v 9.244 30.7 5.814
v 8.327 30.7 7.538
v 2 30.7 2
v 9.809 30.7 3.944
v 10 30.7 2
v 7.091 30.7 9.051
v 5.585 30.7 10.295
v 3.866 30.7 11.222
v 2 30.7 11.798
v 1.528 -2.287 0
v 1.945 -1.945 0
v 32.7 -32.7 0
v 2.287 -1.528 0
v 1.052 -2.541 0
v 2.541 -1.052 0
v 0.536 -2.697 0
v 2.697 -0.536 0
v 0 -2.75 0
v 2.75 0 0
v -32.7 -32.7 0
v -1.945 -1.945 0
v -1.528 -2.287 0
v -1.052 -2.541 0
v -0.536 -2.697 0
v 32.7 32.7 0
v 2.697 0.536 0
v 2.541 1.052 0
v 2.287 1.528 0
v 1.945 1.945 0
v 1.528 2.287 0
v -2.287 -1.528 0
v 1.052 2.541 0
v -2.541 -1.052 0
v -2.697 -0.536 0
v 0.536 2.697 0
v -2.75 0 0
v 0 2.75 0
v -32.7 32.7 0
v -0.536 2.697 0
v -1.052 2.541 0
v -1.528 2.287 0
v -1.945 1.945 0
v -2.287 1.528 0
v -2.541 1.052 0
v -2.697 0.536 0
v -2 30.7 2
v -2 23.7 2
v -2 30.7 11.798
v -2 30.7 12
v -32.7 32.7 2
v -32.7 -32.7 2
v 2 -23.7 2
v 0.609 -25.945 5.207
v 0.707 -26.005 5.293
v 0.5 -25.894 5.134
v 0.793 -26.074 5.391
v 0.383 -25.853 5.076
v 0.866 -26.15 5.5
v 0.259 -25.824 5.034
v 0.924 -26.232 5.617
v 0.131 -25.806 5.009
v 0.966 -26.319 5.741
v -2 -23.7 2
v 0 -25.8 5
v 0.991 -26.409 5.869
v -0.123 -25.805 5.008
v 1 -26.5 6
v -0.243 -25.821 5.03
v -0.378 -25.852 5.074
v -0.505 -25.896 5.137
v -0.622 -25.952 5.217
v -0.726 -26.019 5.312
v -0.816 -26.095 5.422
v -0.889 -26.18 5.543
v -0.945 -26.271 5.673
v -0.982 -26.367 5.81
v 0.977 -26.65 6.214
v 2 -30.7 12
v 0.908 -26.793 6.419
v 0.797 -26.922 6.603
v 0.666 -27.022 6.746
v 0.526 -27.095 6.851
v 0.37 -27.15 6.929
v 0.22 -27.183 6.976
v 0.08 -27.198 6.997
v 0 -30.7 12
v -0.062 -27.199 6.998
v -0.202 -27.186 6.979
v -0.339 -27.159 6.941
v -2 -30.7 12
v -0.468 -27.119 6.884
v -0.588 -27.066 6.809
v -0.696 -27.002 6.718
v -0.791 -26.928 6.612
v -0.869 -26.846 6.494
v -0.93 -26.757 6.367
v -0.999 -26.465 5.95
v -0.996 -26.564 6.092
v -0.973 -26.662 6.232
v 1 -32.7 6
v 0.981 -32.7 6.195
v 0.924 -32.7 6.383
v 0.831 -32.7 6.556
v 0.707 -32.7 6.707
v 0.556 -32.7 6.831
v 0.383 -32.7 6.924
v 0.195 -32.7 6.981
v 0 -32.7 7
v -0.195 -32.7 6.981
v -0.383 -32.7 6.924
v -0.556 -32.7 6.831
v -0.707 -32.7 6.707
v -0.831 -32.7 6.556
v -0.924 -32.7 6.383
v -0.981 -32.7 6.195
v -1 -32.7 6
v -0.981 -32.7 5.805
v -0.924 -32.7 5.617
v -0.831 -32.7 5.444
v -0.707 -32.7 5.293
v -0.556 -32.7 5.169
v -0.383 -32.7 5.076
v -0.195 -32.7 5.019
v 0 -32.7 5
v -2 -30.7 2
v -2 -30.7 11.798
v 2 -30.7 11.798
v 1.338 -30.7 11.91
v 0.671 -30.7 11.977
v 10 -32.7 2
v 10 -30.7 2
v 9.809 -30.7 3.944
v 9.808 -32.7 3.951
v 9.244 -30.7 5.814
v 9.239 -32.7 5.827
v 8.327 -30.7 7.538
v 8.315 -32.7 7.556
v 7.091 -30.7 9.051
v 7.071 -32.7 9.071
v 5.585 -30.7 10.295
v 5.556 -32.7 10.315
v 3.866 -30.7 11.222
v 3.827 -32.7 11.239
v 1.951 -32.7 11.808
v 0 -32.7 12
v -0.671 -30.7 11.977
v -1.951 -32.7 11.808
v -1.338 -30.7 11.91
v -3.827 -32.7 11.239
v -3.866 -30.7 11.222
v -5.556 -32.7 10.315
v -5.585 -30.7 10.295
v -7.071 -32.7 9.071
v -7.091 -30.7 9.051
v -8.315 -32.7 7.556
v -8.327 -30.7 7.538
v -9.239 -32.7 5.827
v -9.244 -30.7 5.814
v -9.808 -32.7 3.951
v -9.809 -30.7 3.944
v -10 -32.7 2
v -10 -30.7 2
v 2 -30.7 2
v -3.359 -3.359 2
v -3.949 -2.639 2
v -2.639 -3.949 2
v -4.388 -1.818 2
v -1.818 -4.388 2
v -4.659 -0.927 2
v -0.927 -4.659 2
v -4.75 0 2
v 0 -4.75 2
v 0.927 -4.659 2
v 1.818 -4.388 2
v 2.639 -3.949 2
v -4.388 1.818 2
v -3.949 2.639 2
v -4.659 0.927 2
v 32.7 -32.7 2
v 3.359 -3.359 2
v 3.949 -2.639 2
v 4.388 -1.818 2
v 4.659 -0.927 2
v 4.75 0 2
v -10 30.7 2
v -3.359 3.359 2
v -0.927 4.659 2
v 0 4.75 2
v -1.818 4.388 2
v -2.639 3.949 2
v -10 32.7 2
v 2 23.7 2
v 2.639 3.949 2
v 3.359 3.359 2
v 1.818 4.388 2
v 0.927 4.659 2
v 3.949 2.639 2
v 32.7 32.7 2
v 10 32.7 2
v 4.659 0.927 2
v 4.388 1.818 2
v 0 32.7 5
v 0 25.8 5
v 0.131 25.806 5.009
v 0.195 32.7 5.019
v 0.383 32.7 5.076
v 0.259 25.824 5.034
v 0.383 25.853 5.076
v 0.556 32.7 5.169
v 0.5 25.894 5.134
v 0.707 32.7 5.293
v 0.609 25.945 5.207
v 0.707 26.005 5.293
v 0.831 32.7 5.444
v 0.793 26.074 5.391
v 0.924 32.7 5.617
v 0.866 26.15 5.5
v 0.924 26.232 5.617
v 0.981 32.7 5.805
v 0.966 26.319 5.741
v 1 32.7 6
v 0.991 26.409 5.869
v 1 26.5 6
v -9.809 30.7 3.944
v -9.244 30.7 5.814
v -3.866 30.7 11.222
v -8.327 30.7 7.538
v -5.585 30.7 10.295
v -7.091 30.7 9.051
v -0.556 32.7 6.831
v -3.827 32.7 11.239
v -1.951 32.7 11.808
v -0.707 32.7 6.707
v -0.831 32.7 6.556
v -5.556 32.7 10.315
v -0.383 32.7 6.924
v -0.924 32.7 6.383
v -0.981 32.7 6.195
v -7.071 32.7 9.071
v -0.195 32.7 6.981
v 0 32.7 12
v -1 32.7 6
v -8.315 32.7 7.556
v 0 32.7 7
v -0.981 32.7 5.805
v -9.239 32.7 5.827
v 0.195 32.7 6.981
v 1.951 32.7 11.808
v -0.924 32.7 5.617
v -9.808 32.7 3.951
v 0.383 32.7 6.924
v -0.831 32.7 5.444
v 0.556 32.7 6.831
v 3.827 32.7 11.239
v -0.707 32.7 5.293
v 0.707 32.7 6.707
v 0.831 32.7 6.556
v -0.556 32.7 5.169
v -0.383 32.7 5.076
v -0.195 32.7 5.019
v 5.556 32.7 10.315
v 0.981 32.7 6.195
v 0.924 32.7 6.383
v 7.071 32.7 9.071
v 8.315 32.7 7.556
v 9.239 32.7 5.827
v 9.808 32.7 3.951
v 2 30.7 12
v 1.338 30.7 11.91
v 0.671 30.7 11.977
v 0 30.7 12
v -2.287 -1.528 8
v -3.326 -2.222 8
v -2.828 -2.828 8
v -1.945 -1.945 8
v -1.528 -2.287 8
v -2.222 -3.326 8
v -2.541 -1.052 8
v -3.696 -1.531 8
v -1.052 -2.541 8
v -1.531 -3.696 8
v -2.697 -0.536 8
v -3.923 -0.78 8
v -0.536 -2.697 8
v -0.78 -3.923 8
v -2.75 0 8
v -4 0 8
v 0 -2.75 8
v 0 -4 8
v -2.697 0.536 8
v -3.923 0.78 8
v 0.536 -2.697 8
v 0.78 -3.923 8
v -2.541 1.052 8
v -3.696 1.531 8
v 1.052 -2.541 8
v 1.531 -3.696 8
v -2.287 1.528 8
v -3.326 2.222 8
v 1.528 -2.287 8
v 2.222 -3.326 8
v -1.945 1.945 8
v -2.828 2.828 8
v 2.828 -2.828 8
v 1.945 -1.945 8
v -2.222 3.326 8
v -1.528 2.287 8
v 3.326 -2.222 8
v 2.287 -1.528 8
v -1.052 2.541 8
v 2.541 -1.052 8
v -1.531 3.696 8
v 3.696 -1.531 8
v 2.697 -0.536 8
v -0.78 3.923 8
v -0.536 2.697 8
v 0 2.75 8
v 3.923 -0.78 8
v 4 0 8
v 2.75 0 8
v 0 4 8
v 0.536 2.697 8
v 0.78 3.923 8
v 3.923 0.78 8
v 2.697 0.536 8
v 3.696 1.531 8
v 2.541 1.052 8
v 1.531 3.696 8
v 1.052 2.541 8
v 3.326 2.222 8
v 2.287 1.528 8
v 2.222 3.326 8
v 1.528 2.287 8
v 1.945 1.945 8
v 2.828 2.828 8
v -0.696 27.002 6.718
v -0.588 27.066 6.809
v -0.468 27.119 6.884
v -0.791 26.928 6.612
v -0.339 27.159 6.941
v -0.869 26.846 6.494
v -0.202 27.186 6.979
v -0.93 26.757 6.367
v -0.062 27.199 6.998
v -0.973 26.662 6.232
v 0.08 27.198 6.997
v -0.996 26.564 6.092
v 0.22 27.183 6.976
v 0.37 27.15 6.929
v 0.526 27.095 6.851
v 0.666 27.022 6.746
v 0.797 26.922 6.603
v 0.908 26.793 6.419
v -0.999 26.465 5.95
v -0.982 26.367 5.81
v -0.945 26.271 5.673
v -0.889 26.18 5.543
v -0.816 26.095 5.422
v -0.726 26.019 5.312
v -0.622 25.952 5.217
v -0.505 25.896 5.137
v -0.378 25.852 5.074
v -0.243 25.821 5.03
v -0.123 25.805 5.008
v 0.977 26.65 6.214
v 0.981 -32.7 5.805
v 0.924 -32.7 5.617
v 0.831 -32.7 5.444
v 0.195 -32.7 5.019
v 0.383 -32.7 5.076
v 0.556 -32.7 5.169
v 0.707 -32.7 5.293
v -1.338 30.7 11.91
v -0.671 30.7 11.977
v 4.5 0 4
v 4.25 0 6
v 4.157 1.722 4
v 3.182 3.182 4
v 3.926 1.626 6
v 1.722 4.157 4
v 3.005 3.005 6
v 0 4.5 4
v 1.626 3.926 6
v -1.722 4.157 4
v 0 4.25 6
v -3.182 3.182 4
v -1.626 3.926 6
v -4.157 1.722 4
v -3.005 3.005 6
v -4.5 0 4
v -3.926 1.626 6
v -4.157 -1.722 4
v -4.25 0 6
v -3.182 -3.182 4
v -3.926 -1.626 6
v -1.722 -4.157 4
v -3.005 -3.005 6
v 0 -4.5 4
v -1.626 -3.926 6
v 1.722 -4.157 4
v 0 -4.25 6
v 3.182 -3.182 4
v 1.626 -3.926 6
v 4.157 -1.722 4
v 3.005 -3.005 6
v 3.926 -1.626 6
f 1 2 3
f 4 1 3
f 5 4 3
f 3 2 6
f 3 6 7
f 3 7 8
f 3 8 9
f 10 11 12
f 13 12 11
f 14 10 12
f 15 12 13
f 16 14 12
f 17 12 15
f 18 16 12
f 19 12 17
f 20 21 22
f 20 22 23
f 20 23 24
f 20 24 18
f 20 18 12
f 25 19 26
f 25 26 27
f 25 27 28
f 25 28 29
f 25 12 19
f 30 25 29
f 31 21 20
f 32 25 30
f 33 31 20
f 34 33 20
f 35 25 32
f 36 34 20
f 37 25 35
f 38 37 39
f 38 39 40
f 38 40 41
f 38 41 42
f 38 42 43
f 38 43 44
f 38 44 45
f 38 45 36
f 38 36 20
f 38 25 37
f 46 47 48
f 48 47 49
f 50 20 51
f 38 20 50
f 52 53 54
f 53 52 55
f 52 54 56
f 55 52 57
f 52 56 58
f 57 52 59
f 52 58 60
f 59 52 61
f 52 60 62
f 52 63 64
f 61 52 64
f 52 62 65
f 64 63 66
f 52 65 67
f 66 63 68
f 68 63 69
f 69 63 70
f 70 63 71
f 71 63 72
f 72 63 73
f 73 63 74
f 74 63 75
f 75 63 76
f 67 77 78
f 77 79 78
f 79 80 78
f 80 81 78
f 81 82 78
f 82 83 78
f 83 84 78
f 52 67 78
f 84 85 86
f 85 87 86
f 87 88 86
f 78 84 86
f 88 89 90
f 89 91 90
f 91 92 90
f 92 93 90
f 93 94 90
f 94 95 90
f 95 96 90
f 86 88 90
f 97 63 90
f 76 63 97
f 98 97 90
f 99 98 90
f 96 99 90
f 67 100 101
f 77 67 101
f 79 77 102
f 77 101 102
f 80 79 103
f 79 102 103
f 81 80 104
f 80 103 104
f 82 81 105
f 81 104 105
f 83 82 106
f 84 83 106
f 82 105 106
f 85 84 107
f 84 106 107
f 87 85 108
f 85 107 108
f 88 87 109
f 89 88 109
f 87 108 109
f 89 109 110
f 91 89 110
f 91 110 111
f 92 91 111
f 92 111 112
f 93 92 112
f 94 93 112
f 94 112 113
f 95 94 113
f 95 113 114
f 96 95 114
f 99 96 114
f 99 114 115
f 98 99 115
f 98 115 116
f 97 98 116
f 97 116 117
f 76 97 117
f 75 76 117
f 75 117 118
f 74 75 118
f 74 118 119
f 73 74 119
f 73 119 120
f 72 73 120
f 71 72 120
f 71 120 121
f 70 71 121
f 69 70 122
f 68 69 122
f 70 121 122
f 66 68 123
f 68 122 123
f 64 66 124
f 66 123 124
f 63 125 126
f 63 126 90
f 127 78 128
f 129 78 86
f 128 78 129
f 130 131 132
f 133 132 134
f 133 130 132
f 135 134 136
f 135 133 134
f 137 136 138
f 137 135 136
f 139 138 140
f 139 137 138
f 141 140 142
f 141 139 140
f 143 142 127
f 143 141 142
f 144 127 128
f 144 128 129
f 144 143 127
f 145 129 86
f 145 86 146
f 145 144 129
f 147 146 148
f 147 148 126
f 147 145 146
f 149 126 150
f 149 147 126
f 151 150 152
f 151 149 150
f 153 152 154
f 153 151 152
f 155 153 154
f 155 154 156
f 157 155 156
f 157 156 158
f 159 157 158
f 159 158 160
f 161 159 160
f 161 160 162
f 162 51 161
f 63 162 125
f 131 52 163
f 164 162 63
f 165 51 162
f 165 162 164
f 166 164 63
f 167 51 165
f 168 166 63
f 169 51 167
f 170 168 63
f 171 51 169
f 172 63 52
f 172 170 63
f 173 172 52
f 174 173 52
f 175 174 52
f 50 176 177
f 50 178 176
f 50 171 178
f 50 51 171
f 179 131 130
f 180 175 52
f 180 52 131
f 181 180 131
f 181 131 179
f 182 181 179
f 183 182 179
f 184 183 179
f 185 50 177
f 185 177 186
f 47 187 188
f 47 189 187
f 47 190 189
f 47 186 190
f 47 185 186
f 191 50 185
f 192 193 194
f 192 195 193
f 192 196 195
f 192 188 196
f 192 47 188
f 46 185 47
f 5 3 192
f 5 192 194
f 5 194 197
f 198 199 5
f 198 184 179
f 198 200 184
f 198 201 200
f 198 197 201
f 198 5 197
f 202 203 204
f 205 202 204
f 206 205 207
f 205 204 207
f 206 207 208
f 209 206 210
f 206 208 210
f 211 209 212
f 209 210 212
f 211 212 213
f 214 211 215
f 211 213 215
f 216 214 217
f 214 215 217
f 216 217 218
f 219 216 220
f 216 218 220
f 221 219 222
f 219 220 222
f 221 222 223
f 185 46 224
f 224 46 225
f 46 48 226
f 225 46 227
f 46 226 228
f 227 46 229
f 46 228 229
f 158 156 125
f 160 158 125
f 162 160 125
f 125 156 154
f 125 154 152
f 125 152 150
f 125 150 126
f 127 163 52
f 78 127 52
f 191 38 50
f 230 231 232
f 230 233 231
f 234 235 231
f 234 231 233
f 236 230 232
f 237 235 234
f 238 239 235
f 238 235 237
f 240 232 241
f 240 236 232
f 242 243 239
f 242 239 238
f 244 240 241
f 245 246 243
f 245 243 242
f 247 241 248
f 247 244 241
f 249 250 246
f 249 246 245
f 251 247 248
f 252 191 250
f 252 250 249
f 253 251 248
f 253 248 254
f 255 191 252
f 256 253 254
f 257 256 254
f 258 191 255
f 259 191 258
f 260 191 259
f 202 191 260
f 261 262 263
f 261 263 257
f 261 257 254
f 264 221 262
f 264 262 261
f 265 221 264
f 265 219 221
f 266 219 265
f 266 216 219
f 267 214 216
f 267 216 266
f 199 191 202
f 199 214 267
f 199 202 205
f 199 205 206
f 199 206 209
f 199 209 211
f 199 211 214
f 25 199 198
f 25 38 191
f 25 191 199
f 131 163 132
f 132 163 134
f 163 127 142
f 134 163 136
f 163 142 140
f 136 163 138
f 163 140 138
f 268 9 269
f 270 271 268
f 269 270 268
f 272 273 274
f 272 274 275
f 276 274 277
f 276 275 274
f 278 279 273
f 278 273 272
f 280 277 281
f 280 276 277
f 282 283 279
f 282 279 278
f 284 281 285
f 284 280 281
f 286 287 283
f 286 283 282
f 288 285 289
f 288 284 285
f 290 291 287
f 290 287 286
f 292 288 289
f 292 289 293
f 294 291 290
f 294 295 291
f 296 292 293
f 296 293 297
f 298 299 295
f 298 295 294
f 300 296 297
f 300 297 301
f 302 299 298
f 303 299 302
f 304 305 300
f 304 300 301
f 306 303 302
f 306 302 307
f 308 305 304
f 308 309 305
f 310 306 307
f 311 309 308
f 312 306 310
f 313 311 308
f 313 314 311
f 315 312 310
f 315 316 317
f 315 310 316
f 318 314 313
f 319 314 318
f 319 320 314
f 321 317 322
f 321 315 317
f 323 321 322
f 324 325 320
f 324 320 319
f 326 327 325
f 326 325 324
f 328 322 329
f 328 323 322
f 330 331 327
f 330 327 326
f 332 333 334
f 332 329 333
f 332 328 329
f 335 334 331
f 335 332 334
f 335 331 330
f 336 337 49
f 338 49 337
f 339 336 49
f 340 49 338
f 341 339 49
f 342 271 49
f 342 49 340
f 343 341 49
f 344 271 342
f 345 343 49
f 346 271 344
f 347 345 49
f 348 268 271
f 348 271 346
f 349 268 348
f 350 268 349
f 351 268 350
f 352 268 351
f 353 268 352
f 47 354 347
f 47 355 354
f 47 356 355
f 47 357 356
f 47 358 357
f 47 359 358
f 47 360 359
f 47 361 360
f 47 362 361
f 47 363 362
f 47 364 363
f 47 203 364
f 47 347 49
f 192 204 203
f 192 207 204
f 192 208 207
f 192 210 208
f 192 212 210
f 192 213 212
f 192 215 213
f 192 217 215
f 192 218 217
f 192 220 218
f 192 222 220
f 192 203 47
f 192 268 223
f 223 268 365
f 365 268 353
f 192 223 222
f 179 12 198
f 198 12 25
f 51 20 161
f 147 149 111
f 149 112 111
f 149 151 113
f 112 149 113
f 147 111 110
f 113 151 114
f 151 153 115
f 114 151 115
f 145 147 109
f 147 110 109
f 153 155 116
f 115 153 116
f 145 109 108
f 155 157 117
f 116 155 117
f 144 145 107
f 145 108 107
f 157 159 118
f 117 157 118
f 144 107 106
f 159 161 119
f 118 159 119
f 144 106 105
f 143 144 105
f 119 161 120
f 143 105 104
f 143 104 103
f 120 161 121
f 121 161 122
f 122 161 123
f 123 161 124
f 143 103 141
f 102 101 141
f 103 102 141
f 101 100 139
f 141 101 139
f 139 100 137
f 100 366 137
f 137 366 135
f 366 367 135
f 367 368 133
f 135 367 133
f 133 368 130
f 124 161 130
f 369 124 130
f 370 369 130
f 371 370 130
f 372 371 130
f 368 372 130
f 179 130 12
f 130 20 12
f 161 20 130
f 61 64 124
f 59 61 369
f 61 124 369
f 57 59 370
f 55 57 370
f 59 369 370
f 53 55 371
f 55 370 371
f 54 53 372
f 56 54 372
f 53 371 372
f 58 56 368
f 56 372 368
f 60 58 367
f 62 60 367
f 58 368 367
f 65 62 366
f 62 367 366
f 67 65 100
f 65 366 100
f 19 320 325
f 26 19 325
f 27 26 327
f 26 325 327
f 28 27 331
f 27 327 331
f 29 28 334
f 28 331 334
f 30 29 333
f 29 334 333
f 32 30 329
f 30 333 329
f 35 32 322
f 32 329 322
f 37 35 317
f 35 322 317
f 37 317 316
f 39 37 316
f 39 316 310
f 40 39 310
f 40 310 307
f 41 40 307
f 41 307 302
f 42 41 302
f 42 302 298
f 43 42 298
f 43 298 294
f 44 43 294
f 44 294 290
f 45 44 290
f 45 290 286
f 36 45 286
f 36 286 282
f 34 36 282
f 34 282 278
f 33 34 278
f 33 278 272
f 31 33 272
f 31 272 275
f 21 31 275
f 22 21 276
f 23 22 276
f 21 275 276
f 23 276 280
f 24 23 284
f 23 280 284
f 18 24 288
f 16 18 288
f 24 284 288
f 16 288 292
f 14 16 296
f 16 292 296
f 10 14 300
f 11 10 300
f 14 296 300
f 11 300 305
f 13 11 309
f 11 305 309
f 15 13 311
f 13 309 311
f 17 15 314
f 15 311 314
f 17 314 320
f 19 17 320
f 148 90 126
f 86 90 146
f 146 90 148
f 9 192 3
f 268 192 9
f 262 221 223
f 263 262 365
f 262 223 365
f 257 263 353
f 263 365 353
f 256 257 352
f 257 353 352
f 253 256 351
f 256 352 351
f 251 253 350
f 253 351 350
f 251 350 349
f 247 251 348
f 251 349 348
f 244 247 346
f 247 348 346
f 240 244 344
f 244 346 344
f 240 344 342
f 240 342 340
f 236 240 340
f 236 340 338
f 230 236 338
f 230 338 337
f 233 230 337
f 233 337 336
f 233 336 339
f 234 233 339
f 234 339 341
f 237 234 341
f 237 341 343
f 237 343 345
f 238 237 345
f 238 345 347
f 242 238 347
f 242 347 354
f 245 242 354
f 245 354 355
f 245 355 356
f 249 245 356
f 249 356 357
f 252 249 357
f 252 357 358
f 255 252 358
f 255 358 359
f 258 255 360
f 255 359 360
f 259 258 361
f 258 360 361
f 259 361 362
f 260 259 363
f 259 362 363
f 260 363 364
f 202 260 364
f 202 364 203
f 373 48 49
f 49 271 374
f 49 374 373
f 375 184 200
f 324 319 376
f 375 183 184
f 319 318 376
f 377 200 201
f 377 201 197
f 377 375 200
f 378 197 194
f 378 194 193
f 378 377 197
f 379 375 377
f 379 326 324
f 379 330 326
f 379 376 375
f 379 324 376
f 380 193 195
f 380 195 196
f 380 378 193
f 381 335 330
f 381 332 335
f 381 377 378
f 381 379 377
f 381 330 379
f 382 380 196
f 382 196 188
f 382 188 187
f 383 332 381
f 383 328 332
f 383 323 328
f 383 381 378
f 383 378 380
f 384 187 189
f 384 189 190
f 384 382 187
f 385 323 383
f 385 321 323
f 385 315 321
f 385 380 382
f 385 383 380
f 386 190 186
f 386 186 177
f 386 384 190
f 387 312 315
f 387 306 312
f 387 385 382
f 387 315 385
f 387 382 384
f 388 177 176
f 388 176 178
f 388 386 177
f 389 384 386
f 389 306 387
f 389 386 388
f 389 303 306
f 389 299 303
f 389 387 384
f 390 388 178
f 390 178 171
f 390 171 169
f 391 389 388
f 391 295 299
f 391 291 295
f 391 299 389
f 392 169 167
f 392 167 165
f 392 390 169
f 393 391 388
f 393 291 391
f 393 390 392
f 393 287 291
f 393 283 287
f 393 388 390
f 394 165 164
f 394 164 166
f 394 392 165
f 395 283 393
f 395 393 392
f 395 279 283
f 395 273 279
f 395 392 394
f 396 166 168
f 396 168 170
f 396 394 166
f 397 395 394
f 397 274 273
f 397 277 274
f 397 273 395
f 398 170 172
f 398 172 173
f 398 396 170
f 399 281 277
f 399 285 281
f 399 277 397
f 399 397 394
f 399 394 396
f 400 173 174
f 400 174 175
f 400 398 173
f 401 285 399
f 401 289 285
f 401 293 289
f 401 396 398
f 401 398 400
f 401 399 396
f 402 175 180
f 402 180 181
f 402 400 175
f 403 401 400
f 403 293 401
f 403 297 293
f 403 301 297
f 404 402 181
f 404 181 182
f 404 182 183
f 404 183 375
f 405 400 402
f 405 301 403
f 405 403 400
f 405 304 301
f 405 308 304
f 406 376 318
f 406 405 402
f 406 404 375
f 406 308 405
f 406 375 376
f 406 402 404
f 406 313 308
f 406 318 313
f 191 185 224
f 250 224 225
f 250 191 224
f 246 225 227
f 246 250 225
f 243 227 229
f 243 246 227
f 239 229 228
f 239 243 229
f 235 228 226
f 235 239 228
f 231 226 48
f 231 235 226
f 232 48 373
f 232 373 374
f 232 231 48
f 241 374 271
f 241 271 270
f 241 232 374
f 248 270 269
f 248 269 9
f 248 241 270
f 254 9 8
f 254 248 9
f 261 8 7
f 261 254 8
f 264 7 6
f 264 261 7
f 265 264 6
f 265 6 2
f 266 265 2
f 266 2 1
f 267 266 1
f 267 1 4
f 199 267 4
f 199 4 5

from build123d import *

# Parameters (mm, degrees)
F0_W          = 65.4
F0_H          = 65.4
F1_DEPTH      = 2
F3_DEPTH      = 2
F5_DEPTH      = 2
F7_DEPTH      = 2
F7_DEPTH_BACK = 2
F9_DEPTH      = 65.401
F12_R         = 2.75
F13_DEPTH     = 8.001


with BuildPart() as f1:
    # F0 (on Top) → F1 (new body)
    with BuildSketch(Plane.XY):
        Rectangle(F0_W, F0_H)
    extrude(amount=F1_DEPTH)

    # F2 (on face) → F3 (join)
    with BuildSketch(Plane.XZ.offset(32.7)):
        with BuildLine():
            Line((-10, 2), (0, 2))
            Line((0, 2), (10, 2))
            ThreePointArc((10, 2), (0, 12), (-10, 2))
        make_face()
    extrude(amount=-F3_DEPTH)

    # F4 (on face) → F5 (join)
    with BuildSketch(Plane(origin=(0, 32.7, 0), x_dir=(-1, 0, 0), z_dir=(0, 1, 0))):
        with BuildLine():
            Line((-10, 2), (0, 2))
            Line((0, 2), (10, 2))
            ThreePointArc((10, 2), (0, 12), (-10, 2))
        make_face()
    extrude(amount=-F5_DEPTH)

    # F6 (on Right) → F7 (join, two sides)
    with BuildSketch(Plane.YZ) as f7_sk:
        Polygon((23.7, 2), (30.7, 2), (30.7, 12), align=None)
        Polygon((-23.7, 2), (-30.7, 12), (-30.7, 2), align=None)
    extrude(amount=F7_DEPTH)
    extrude(f7_sk.sketch, amount=-F7_DEPTH_BACK)

    # F8 (on face) → F9 (cut, through all)
    with BuildSketch(Plane.XZ.offset(32.7)):
        with BuildLine():
            ThreePointArc((0, 5), (0.707107, 5.292893), (1, 6))
            ThreePointArc((1, 6), (-0.707107, 6.707107), (0, 5))
        make_face()
    extrude(amount=-F9_DEPTH, mode=Mode.SUBTRACT)

    # F10 (on Front) → F11 (revolve)
    with BuildSketch(Plane.XZ):
        Polygon((0, 8), (0, 0), (5, 0), (4, 8), align=None)
    revolve(axis=Axis((0, 0, 4), (0, 0, 1)))

    # F12 (on face) → F13 (cut, through all)
    with BuildSketch(Plane.XY.offset(8)):
        Circle(F12_R)
    extrude(amount=-F13_DEPTH, mode=Mode.SUBTRACT)


solid = f1.part
